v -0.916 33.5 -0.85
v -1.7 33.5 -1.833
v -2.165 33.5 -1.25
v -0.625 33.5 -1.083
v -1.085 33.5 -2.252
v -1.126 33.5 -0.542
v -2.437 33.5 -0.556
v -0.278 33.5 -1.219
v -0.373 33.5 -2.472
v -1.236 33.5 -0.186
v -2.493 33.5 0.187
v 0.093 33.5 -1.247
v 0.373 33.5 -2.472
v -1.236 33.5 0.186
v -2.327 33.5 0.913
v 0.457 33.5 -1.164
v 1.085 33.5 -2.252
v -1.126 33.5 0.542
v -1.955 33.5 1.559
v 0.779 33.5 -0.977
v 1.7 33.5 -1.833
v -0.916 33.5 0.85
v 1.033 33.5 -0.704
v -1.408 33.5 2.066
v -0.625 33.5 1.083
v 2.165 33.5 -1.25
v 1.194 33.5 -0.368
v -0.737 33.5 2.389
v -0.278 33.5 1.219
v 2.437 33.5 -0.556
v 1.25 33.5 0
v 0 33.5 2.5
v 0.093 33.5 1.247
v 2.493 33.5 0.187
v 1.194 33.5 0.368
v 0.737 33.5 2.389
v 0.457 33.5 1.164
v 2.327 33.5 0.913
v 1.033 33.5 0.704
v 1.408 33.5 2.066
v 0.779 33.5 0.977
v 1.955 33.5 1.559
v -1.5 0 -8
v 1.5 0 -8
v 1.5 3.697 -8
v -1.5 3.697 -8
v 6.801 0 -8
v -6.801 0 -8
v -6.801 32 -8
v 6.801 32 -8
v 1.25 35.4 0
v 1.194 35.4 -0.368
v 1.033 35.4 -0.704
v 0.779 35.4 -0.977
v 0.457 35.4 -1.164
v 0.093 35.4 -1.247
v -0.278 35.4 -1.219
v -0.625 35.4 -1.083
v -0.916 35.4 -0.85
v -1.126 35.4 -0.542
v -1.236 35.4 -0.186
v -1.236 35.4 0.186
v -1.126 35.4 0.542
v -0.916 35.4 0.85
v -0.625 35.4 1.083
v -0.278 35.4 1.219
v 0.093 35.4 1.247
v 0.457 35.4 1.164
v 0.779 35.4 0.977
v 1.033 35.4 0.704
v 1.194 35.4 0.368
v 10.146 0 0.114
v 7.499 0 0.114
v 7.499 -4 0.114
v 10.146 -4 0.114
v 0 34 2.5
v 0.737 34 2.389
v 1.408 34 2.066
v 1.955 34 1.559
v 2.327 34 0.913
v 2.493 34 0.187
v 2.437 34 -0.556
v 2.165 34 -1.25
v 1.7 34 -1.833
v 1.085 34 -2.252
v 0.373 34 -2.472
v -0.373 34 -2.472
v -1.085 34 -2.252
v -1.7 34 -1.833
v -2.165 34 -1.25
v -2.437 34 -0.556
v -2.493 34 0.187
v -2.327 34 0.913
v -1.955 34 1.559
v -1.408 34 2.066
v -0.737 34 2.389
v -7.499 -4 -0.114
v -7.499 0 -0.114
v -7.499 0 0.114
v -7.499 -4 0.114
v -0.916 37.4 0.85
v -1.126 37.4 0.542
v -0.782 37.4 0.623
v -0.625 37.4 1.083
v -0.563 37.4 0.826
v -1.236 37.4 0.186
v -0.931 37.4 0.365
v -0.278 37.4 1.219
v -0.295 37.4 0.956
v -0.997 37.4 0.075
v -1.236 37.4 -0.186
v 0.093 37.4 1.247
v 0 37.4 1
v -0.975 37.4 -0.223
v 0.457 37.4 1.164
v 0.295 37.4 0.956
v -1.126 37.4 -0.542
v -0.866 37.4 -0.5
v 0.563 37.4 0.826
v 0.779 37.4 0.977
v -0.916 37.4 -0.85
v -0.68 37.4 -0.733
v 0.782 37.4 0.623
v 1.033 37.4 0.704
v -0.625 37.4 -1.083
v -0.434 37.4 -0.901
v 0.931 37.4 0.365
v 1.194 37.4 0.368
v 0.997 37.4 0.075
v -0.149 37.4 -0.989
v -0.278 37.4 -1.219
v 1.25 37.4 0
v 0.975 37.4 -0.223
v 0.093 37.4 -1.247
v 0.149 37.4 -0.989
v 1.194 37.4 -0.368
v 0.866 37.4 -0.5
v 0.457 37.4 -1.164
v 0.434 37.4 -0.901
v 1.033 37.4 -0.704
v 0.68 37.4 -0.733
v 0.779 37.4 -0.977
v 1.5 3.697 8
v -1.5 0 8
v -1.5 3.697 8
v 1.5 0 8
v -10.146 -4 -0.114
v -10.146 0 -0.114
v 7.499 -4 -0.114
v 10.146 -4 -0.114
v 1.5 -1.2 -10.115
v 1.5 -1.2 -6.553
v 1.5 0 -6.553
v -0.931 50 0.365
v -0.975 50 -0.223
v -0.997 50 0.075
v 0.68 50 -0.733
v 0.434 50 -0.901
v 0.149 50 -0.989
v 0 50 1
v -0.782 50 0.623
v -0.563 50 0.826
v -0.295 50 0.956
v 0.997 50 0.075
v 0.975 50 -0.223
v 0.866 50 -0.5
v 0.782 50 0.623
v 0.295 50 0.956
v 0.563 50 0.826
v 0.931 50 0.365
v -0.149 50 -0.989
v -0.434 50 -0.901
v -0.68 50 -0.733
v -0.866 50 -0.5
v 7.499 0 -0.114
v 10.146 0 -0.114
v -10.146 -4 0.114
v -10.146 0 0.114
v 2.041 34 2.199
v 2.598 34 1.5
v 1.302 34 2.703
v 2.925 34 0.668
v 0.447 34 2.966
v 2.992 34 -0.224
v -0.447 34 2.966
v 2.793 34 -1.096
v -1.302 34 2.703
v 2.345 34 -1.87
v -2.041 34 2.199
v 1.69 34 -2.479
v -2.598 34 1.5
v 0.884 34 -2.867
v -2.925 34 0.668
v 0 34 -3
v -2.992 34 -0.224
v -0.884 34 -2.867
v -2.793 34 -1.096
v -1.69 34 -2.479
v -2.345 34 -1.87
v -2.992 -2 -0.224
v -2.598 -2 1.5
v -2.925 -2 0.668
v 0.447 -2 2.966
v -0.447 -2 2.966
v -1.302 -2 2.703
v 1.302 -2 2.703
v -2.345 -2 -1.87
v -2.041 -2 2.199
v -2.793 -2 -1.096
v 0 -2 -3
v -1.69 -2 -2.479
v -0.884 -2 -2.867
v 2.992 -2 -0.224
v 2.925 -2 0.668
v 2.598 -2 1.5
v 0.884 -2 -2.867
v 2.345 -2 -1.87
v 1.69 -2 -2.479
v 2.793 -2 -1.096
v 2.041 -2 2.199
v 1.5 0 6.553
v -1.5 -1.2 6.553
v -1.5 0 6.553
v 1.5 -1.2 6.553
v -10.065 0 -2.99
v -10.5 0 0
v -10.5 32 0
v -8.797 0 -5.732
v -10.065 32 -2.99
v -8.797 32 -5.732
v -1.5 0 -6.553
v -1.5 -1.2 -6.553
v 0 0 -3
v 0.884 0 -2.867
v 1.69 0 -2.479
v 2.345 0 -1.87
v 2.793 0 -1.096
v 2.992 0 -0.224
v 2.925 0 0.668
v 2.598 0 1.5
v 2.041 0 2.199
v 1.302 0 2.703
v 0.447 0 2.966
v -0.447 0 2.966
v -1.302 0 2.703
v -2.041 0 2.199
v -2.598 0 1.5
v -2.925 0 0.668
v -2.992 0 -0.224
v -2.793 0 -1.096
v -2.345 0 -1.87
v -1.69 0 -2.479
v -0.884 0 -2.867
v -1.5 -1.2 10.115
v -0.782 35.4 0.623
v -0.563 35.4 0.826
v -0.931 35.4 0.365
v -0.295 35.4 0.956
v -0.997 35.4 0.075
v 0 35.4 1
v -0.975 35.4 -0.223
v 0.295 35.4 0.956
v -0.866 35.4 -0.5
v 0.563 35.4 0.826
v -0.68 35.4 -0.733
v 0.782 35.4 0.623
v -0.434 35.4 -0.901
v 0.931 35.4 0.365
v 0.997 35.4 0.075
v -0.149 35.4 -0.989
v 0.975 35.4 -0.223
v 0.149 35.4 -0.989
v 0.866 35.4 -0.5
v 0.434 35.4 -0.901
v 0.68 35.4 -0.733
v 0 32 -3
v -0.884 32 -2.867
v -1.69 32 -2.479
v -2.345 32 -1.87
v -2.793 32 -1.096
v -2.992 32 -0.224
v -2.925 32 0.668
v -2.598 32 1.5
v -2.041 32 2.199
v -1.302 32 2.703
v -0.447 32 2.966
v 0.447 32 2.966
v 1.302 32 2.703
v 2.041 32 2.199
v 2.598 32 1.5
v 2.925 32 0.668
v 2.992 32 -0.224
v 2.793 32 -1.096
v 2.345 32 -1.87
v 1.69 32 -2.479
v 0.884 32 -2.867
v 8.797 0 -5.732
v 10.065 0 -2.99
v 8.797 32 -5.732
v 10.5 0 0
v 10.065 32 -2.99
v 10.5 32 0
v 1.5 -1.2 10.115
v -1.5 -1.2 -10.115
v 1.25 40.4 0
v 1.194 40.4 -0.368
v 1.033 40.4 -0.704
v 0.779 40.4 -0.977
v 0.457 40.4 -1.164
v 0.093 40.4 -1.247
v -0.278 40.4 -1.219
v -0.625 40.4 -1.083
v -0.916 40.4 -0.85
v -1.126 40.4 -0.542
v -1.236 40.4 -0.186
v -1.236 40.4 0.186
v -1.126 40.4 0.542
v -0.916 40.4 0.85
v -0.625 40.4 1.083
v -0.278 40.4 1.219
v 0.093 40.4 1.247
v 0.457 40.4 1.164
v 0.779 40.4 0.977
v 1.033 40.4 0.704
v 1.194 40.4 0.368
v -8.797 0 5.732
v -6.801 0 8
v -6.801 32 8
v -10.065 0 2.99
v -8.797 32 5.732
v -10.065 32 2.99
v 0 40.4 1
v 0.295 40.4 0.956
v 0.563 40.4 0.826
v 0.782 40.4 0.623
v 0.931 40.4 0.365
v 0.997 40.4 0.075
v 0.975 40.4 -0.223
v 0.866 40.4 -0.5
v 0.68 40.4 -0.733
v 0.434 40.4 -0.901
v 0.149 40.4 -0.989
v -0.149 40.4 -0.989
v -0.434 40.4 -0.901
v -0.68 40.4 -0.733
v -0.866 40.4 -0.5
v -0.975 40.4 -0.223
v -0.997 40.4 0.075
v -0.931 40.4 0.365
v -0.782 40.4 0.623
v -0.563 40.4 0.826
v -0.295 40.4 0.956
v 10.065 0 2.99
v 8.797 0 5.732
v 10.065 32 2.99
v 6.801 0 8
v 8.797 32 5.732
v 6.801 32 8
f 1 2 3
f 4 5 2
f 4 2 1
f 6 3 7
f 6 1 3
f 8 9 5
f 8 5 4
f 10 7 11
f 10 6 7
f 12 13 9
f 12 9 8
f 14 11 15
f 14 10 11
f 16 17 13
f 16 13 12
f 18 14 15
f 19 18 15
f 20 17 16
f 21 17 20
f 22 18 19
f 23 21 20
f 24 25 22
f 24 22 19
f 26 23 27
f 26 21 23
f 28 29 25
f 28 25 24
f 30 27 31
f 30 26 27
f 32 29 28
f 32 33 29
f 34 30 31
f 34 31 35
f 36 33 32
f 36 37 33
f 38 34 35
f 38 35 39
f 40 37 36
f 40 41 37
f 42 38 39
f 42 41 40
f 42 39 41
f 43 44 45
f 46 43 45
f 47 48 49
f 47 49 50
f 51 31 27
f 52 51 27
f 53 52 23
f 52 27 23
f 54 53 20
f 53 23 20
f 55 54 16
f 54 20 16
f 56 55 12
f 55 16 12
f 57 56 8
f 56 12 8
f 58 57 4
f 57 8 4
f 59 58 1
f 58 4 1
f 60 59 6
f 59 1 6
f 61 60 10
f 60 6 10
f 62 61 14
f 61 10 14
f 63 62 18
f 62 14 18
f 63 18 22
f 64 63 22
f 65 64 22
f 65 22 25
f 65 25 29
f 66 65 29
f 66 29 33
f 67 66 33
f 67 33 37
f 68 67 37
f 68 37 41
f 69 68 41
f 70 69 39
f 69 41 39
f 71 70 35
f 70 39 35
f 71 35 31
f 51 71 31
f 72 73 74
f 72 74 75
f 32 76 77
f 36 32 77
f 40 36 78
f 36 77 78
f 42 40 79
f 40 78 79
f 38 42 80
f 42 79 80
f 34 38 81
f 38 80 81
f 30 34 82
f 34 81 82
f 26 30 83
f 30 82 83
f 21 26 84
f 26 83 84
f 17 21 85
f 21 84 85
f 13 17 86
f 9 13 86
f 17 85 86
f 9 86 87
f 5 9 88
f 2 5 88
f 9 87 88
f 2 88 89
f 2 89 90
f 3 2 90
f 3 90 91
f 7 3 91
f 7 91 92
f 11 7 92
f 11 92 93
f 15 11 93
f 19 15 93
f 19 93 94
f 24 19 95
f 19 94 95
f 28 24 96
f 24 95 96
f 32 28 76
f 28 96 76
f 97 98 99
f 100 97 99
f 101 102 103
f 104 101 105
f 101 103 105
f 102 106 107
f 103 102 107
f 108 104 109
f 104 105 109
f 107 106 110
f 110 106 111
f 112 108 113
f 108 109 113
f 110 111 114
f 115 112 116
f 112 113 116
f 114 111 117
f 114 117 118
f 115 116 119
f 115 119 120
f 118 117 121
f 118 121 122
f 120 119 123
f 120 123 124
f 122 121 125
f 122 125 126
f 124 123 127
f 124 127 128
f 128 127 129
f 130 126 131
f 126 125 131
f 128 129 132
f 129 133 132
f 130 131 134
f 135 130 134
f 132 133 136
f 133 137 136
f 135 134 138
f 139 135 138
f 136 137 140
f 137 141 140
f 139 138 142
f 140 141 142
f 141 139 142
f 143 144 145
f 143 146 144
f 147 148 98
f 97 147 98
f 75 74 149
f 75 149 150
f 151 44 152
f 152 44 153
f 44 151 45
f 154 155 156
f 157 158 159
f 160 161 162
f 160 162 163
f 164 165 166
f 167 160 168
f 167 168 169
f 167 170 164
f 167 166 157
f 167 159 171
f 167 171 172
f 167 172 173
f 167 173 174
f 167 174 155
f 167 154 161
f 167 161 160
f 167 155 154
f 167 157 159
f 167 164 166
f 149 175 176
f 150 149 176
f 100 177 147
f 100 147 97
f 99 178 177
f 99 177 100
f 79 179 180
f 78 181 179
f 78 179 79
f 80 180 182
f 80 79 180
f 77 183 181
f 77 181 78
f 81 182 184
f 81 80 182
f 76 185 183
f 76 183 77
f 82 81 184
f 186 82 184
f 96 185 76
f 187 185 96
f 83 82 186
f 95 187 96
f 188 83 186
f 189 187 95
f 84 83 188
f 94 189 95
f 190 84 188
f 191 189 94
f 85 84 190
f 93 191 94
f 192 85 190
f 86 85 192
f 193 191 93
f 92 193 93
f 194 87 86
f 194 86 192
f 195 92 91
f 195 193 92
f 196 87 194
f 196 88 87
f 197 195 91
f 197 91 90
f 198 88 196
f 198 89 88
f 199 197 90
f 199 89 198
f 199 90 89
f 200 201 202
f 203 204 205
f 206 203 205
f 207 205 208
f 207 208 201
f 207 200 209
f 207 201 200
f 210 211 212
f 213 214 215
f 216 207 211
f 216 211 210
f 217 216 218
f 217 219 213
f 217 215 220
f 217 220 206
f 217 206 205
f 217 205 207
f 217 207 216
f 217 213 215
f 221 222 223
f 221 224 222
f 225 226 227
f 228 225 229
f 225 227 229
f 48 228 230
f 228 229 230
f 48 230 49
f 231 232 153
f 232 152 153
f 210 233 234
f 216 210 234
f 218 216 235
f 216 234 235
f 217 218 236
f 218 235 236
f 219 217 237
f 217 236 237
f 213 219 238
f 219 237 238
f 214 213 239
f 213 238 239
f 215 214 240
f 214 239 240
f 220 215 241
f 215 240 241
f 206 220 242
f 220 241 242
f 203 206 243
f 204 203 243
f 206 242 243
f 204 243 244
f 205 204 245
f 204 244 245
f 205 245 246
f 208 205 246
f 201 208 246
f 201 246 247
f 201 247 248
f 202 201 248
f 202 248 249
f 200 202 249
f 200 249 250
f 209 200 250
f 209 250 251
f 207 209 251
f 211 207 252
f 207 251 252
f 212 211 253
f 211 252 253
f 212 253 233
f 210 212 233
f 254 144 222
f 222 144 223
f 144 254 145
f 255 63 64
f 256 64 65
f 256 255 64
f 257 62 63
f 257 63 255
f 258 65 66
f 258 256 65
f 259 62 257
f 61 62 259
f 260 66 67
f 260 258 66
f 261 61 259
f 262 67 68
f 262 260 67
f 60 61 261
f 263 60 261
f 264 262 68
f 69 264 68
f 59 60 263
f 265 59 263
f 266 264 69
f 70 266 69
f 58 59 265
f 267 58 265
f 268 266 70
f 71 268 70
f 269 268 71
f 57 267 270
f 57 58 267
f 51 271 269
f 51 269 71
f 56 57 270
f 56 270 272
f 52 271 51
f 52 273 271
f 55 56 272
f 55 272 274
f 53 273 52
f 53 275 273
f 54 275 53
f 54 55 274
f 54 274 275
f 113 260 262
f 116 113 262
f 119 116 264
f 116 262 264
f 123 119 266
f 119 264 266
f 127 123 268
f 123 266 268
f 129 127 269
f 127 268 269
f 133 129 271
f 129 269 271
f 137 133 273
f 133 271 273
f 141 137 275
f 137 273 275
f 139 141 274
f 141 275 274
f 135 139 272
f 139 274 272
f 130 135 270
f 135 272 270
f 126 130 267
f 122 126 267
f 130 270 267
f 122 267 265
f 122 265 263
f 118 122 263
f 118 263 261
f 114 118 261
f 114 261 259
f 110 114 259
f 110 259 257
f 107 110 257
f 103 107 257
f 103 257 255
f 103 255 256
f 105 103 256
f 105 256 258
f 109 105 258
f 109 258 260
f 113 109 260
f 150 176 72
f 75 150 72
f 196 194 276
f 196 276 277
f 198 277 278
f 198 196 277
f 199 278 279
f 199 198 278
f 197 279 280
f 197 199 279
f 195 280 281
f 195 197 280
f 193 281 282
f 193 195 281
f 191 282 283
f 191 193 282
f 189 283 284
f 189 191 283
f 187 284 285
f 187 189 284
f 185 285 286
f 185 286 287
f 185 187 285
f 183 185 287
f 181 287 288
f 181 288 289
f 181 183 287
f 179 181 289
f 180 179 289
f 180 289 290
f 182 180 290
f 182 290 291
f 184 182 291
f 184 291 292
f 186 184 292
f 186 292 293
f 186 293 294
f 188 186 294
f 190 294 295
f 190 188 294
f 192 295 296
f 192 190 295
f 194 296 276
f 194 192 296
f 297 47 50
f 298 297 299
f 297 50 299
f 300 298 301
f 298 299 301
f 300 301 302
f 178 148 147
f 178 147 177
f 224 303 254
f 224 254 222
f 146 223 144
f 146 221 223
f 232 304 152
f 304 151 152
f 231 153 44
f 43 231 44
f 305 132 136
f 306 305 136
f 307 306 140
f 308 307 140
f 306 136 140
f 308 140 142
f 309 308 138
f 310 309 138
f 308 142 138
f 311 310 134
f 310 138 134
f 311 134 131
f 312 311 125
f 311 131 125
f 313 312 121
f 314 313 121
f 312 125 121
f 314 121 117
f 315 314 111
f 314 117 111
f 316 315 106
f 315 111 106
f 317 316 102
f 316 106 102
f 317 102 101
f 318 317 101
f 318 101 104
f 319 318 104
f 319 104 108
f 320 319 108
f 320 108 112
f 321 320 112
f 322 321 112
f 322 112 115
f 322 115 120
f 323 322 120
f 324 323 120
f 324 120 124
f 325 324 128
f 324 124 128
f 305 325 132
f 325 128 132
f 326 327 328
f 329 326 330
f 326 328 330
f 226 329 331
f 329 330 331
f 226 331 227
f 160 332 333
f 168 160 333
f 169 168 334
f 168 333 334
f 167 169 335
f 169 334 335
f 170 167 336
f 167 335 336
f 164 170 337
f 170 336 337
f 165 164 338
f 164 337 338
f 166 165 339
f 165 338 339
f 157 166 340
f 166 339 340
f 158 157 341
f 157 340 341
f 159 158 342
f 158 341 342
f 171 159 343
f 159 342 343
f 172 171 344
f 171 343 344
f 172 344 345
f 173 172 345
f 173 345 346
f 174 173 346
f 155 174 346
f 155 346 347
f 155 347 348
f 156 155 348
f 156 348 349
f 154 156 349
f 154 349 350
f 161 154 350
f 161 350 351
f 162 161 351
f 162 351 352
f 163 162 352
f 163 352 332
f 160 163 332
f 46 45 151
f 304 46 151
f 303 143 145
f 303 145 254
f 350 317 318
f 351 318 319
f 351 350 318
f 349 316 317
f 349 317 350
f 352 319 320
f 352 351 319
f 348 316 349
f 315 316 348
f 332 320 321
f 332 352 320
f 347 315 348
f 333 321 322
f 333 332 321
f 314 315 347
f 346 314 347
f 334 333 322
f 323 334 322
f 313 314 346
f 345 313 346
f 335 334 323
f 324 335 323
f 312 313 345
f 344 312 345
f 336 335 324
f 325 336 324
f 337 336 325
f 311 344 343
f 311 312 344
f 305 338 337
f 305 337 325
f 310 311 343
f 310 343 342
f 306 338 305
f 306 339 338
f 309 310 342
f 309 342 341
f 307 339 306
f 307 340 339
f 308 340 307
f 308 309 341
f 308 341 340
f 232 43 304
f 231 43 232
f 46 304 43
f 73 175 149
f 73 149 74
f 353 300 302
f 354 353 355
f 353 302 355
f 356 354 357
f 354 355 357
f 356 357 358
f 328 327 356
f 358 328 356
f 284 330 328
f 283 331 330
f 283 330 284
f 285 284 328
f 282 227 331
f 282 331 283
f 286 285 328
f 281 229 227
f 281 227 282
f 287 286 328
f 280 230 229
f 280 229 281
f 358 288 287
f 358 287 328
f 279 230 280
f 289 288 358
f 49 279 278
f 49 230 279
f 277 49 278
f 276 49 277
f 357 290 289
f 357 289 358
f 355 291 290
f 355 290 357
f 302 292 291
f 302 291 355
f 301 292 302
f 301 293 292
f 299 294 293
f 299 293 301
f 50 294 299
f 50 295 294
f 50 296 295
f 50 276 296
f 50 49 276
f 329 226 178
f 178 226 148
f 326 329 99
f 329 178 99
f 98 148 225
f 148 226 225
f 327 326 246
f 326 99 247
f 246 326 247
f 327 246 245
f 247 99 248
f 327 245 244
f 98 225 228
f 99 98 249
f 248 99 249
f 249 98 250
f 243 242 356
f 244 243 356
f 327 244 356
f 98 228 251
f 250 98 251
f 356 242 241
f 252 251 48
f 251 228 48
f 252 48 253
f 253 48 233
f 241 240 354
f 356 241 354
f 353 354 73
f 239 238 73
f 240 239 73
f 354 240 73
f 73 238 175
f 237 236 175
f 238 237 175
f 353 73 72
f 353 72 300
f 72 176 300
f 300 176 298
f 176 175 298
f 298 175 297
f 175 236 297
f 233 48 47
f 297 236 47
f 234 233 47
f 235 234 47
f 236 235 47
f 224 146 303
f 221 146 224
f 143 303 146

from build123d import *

# Parameters (mm, degrees)
SKETCH_1_W          = 21
SKETCH_1_H          = 16
EXTRUDE_1_DEPTH     = 32
SKETCH_2_R          = 3
EXTRUDE_2_DEPTH     = 2
CUT_EXTRUDE_1_DEPTH = 37.47259245
SKETCH_4_W          = 2.646859644
SKETCH_4_H          = 0.228740956
EXTRUDE_3_DEPTH     = 4
EXTRUDE_START       = 2
SKETCH_5_R          = 3
EXTRUDE_4_DEPTH     = 2
SKETCH_6_R          = 2.5
CUT_EXTRUDE_2_DEPTH = 0.5
SKETCH_7_R          = 1
EXTRUDE_5_DEPTH     = 16.5
SKETCH_8_R          = 1.25
SKETCH_8_R_2        = 1
EXTRUDE_6_DEPTH     = 1.9
SKETCH_9_R          = 1.25
SKETCH_9_R_2        = 1
EXTRUDE_7_DEPTH     = 3
EXTRUDE_8_DEPTH     = 1.5
EXTRUDE_8_2_DEPTH   = 1.5


with BuildPart() as part:
    # 草图1 → 凸台-拉伸1 (new body)
    with BuildSketch(Plane(origin=(0, 0, 0), x_dir=(1, 0, 0), z_dir=(0, 1, 0))):
        Rectangle(SKETCH_1_W, SKETCH_1_H)
    extrude(amount=EXTRUDE_1_DEPTH)

    # 草图2 → 凸台-拉伸2 (add)
    with BuildSketch(Plane.XZ):
        with Locations(Location((0, 0, 0), (0, 0, 270))):
            Circle(SKETCH_2_R)
    extrude(amount=EXTRUDE_2_DEPTH)

    # 草图3 → 切除-拉伸1 (cut, through all)
    with BuildSketch(Plane(origin=(0, 32, 0), x_dir=(1, 0, 0), z_dir=(0, 1, 0))):
        with BuildLine():
            ThreePointArc((-6.800735254, -8), (-9.530417624, -4.406942241), (-10.5, 0))
            Line((-10.5, 0), (-10.5, -8))
            Line((-10.5, -8), (-6.800735254, -8))
        make_face()
        with BuildLine():
            Line((10.5, -8), (10.5, 0))
            ThreePointArc((10.5, 0), (9.530417624, -4.406942241), (6.800735254, -8))
            Line((6.800735254, -8), (10.5, -8))
        make_face()
        with BuildLine():
            Line((10.5, 8), (6.800735254, 8))
            ThreePointArc((6.800735254, 8), (9.530417624, 4.406942241), (10.5, 0))
            Line((10.5, 0), (10.5, 8))
        make_face()
        with BuildLine():
            ThreePointArc((-10.5, 0), (-9.530417624, 4.406942241), (-6.800735254, 8))
            Line((-6.800735254, 8), (-10.5, 8))
            Line((-10.5, 8), (-10.5, 0))
        make_face()
    extrude(amount=-CUT_EXTRUDE_1_DEPTH, mode=Mode.SUBTRACT)

    # 草图4 → 凸台-拉伸3 (add)
    with BuildSketch(Plane.XZ):
        with Locations((-8.822865481, 0)):
            Rectangle(SKETCH_4_W, SKETCH_4_H)
        with Locations((8.822865481, 0)):
            Rectangle(SKETCH_4_W, SKETCH_4_H)
    extrude(amount=EXTRUDE_3_DEPTH)

    # 草图5 → 凸台-拉伸4 (add)
    with BuildSketch(Plane(origin=(0, 32, 0), x_dir=(1, 0, 0), z_dir=(0, 1, 0)).offset(EXTRUDE_START)):
        with Locations(Location((0, 0, 0), (0, 0, 90))):
            Circle(SKETCH_5_R)
    extrude(amount=-EXTRUDE_4_DEPTH)

    # 草图6 → 切除-拉伸2 (cut)
    with BuildSketch(Plane(origin=(0, 34, 0), x_dir=(1, 0, 0), z_dir=(0, 1, 0))):
        with Locations(Location((0, 0, 0), (0, 0, 270))):
            Circle(SKETCH_6_R)
    extrude(amount=-CUT_EXTRUDE_2_DEPTH, mode=Mode.SUBTRACT)

    # 草图7 → 凸台-拉伸5 (add)
    with BuildSketch(Plane(origin=(0, 33.5, 0), x_dir=(1, 0, 0), z_dir=(0, 1, 0))):
        with Locations(Location((0, 0, 0), (0, 0, 270))):
            Circle(SKETCH_7_R)
    extrude(amount=EXTRUDE_5_DEPTH)

    # 草图8 → 凸台-拉伸6 (add)
    # profile 1 of 2: a face of its own
    with BuildSketch(Plane(origin=(0, 33.5, 0), x_dir=(1, 0, 0), z_dir=(0, 1, 0))):
        Circle(SKETCH_8_R)
        Circle(SKETCH_8_R_2, mode=Mode.SUBTRACT)
    # profile 2 of 2: a face of its own
    with BuildSketch(Plane(origin=(0, 33.5, 0), x_dir=(1, 0, 0), z_dir=(0, 1, 0))):
        Circle(SKETCH_8_R_2)
    extrude(amount=EXTRUDE_6_DEPTH)

    # 草图9 → 凸台-拉伸7 (add)
    with BuildSketch(Plane(origin=(0, 37.4, 0), x_dir=(1, 0, 0), z_dir=(0, 1, 0))):
        Circle(SKETCH_9_R)
        Circle(SKETCH_9_R_2, mode=Mode.SUBTRACT)
    extrude(amount=EXTRUDE_7_DEPTH)


with BuildPart() as body_2:
    # 草图11 → 凸台-拉伸8 (new, symmetric)
    with BuildSketch(Plane(origin=(0, 0, 0), x_dir=(0, 0, -1), z_dir=(1, 0, 0))):
        Polygon((8, 3.697239799), (10.114850758, -1.2), (6.552999181, -1.2), (6.552999181, 0), (8, 0), align=None)
    extrude(amount=EXTRUDE_8_DEPTH, both=True)


with BuildPart() as body_3:
    # 草图11 → Extrude 8 2 (new, symmetric)
    with BuildSketch(Plane(origin=(0, 0, 0), x_dir=(0, 0, -1), z_dir=(1, 0, 0))):
        Polygon((-8, 0), (-8, 3.697239799), (-10.114850758, -1.2), (-6.552999181, -1.2), (-6.552999181, 0), align=None)
    extrude(amount=EXTRUDE_8_2_DEPTH, both=True)


solid = Compound([part.part, body_2.part, body_3.part])
